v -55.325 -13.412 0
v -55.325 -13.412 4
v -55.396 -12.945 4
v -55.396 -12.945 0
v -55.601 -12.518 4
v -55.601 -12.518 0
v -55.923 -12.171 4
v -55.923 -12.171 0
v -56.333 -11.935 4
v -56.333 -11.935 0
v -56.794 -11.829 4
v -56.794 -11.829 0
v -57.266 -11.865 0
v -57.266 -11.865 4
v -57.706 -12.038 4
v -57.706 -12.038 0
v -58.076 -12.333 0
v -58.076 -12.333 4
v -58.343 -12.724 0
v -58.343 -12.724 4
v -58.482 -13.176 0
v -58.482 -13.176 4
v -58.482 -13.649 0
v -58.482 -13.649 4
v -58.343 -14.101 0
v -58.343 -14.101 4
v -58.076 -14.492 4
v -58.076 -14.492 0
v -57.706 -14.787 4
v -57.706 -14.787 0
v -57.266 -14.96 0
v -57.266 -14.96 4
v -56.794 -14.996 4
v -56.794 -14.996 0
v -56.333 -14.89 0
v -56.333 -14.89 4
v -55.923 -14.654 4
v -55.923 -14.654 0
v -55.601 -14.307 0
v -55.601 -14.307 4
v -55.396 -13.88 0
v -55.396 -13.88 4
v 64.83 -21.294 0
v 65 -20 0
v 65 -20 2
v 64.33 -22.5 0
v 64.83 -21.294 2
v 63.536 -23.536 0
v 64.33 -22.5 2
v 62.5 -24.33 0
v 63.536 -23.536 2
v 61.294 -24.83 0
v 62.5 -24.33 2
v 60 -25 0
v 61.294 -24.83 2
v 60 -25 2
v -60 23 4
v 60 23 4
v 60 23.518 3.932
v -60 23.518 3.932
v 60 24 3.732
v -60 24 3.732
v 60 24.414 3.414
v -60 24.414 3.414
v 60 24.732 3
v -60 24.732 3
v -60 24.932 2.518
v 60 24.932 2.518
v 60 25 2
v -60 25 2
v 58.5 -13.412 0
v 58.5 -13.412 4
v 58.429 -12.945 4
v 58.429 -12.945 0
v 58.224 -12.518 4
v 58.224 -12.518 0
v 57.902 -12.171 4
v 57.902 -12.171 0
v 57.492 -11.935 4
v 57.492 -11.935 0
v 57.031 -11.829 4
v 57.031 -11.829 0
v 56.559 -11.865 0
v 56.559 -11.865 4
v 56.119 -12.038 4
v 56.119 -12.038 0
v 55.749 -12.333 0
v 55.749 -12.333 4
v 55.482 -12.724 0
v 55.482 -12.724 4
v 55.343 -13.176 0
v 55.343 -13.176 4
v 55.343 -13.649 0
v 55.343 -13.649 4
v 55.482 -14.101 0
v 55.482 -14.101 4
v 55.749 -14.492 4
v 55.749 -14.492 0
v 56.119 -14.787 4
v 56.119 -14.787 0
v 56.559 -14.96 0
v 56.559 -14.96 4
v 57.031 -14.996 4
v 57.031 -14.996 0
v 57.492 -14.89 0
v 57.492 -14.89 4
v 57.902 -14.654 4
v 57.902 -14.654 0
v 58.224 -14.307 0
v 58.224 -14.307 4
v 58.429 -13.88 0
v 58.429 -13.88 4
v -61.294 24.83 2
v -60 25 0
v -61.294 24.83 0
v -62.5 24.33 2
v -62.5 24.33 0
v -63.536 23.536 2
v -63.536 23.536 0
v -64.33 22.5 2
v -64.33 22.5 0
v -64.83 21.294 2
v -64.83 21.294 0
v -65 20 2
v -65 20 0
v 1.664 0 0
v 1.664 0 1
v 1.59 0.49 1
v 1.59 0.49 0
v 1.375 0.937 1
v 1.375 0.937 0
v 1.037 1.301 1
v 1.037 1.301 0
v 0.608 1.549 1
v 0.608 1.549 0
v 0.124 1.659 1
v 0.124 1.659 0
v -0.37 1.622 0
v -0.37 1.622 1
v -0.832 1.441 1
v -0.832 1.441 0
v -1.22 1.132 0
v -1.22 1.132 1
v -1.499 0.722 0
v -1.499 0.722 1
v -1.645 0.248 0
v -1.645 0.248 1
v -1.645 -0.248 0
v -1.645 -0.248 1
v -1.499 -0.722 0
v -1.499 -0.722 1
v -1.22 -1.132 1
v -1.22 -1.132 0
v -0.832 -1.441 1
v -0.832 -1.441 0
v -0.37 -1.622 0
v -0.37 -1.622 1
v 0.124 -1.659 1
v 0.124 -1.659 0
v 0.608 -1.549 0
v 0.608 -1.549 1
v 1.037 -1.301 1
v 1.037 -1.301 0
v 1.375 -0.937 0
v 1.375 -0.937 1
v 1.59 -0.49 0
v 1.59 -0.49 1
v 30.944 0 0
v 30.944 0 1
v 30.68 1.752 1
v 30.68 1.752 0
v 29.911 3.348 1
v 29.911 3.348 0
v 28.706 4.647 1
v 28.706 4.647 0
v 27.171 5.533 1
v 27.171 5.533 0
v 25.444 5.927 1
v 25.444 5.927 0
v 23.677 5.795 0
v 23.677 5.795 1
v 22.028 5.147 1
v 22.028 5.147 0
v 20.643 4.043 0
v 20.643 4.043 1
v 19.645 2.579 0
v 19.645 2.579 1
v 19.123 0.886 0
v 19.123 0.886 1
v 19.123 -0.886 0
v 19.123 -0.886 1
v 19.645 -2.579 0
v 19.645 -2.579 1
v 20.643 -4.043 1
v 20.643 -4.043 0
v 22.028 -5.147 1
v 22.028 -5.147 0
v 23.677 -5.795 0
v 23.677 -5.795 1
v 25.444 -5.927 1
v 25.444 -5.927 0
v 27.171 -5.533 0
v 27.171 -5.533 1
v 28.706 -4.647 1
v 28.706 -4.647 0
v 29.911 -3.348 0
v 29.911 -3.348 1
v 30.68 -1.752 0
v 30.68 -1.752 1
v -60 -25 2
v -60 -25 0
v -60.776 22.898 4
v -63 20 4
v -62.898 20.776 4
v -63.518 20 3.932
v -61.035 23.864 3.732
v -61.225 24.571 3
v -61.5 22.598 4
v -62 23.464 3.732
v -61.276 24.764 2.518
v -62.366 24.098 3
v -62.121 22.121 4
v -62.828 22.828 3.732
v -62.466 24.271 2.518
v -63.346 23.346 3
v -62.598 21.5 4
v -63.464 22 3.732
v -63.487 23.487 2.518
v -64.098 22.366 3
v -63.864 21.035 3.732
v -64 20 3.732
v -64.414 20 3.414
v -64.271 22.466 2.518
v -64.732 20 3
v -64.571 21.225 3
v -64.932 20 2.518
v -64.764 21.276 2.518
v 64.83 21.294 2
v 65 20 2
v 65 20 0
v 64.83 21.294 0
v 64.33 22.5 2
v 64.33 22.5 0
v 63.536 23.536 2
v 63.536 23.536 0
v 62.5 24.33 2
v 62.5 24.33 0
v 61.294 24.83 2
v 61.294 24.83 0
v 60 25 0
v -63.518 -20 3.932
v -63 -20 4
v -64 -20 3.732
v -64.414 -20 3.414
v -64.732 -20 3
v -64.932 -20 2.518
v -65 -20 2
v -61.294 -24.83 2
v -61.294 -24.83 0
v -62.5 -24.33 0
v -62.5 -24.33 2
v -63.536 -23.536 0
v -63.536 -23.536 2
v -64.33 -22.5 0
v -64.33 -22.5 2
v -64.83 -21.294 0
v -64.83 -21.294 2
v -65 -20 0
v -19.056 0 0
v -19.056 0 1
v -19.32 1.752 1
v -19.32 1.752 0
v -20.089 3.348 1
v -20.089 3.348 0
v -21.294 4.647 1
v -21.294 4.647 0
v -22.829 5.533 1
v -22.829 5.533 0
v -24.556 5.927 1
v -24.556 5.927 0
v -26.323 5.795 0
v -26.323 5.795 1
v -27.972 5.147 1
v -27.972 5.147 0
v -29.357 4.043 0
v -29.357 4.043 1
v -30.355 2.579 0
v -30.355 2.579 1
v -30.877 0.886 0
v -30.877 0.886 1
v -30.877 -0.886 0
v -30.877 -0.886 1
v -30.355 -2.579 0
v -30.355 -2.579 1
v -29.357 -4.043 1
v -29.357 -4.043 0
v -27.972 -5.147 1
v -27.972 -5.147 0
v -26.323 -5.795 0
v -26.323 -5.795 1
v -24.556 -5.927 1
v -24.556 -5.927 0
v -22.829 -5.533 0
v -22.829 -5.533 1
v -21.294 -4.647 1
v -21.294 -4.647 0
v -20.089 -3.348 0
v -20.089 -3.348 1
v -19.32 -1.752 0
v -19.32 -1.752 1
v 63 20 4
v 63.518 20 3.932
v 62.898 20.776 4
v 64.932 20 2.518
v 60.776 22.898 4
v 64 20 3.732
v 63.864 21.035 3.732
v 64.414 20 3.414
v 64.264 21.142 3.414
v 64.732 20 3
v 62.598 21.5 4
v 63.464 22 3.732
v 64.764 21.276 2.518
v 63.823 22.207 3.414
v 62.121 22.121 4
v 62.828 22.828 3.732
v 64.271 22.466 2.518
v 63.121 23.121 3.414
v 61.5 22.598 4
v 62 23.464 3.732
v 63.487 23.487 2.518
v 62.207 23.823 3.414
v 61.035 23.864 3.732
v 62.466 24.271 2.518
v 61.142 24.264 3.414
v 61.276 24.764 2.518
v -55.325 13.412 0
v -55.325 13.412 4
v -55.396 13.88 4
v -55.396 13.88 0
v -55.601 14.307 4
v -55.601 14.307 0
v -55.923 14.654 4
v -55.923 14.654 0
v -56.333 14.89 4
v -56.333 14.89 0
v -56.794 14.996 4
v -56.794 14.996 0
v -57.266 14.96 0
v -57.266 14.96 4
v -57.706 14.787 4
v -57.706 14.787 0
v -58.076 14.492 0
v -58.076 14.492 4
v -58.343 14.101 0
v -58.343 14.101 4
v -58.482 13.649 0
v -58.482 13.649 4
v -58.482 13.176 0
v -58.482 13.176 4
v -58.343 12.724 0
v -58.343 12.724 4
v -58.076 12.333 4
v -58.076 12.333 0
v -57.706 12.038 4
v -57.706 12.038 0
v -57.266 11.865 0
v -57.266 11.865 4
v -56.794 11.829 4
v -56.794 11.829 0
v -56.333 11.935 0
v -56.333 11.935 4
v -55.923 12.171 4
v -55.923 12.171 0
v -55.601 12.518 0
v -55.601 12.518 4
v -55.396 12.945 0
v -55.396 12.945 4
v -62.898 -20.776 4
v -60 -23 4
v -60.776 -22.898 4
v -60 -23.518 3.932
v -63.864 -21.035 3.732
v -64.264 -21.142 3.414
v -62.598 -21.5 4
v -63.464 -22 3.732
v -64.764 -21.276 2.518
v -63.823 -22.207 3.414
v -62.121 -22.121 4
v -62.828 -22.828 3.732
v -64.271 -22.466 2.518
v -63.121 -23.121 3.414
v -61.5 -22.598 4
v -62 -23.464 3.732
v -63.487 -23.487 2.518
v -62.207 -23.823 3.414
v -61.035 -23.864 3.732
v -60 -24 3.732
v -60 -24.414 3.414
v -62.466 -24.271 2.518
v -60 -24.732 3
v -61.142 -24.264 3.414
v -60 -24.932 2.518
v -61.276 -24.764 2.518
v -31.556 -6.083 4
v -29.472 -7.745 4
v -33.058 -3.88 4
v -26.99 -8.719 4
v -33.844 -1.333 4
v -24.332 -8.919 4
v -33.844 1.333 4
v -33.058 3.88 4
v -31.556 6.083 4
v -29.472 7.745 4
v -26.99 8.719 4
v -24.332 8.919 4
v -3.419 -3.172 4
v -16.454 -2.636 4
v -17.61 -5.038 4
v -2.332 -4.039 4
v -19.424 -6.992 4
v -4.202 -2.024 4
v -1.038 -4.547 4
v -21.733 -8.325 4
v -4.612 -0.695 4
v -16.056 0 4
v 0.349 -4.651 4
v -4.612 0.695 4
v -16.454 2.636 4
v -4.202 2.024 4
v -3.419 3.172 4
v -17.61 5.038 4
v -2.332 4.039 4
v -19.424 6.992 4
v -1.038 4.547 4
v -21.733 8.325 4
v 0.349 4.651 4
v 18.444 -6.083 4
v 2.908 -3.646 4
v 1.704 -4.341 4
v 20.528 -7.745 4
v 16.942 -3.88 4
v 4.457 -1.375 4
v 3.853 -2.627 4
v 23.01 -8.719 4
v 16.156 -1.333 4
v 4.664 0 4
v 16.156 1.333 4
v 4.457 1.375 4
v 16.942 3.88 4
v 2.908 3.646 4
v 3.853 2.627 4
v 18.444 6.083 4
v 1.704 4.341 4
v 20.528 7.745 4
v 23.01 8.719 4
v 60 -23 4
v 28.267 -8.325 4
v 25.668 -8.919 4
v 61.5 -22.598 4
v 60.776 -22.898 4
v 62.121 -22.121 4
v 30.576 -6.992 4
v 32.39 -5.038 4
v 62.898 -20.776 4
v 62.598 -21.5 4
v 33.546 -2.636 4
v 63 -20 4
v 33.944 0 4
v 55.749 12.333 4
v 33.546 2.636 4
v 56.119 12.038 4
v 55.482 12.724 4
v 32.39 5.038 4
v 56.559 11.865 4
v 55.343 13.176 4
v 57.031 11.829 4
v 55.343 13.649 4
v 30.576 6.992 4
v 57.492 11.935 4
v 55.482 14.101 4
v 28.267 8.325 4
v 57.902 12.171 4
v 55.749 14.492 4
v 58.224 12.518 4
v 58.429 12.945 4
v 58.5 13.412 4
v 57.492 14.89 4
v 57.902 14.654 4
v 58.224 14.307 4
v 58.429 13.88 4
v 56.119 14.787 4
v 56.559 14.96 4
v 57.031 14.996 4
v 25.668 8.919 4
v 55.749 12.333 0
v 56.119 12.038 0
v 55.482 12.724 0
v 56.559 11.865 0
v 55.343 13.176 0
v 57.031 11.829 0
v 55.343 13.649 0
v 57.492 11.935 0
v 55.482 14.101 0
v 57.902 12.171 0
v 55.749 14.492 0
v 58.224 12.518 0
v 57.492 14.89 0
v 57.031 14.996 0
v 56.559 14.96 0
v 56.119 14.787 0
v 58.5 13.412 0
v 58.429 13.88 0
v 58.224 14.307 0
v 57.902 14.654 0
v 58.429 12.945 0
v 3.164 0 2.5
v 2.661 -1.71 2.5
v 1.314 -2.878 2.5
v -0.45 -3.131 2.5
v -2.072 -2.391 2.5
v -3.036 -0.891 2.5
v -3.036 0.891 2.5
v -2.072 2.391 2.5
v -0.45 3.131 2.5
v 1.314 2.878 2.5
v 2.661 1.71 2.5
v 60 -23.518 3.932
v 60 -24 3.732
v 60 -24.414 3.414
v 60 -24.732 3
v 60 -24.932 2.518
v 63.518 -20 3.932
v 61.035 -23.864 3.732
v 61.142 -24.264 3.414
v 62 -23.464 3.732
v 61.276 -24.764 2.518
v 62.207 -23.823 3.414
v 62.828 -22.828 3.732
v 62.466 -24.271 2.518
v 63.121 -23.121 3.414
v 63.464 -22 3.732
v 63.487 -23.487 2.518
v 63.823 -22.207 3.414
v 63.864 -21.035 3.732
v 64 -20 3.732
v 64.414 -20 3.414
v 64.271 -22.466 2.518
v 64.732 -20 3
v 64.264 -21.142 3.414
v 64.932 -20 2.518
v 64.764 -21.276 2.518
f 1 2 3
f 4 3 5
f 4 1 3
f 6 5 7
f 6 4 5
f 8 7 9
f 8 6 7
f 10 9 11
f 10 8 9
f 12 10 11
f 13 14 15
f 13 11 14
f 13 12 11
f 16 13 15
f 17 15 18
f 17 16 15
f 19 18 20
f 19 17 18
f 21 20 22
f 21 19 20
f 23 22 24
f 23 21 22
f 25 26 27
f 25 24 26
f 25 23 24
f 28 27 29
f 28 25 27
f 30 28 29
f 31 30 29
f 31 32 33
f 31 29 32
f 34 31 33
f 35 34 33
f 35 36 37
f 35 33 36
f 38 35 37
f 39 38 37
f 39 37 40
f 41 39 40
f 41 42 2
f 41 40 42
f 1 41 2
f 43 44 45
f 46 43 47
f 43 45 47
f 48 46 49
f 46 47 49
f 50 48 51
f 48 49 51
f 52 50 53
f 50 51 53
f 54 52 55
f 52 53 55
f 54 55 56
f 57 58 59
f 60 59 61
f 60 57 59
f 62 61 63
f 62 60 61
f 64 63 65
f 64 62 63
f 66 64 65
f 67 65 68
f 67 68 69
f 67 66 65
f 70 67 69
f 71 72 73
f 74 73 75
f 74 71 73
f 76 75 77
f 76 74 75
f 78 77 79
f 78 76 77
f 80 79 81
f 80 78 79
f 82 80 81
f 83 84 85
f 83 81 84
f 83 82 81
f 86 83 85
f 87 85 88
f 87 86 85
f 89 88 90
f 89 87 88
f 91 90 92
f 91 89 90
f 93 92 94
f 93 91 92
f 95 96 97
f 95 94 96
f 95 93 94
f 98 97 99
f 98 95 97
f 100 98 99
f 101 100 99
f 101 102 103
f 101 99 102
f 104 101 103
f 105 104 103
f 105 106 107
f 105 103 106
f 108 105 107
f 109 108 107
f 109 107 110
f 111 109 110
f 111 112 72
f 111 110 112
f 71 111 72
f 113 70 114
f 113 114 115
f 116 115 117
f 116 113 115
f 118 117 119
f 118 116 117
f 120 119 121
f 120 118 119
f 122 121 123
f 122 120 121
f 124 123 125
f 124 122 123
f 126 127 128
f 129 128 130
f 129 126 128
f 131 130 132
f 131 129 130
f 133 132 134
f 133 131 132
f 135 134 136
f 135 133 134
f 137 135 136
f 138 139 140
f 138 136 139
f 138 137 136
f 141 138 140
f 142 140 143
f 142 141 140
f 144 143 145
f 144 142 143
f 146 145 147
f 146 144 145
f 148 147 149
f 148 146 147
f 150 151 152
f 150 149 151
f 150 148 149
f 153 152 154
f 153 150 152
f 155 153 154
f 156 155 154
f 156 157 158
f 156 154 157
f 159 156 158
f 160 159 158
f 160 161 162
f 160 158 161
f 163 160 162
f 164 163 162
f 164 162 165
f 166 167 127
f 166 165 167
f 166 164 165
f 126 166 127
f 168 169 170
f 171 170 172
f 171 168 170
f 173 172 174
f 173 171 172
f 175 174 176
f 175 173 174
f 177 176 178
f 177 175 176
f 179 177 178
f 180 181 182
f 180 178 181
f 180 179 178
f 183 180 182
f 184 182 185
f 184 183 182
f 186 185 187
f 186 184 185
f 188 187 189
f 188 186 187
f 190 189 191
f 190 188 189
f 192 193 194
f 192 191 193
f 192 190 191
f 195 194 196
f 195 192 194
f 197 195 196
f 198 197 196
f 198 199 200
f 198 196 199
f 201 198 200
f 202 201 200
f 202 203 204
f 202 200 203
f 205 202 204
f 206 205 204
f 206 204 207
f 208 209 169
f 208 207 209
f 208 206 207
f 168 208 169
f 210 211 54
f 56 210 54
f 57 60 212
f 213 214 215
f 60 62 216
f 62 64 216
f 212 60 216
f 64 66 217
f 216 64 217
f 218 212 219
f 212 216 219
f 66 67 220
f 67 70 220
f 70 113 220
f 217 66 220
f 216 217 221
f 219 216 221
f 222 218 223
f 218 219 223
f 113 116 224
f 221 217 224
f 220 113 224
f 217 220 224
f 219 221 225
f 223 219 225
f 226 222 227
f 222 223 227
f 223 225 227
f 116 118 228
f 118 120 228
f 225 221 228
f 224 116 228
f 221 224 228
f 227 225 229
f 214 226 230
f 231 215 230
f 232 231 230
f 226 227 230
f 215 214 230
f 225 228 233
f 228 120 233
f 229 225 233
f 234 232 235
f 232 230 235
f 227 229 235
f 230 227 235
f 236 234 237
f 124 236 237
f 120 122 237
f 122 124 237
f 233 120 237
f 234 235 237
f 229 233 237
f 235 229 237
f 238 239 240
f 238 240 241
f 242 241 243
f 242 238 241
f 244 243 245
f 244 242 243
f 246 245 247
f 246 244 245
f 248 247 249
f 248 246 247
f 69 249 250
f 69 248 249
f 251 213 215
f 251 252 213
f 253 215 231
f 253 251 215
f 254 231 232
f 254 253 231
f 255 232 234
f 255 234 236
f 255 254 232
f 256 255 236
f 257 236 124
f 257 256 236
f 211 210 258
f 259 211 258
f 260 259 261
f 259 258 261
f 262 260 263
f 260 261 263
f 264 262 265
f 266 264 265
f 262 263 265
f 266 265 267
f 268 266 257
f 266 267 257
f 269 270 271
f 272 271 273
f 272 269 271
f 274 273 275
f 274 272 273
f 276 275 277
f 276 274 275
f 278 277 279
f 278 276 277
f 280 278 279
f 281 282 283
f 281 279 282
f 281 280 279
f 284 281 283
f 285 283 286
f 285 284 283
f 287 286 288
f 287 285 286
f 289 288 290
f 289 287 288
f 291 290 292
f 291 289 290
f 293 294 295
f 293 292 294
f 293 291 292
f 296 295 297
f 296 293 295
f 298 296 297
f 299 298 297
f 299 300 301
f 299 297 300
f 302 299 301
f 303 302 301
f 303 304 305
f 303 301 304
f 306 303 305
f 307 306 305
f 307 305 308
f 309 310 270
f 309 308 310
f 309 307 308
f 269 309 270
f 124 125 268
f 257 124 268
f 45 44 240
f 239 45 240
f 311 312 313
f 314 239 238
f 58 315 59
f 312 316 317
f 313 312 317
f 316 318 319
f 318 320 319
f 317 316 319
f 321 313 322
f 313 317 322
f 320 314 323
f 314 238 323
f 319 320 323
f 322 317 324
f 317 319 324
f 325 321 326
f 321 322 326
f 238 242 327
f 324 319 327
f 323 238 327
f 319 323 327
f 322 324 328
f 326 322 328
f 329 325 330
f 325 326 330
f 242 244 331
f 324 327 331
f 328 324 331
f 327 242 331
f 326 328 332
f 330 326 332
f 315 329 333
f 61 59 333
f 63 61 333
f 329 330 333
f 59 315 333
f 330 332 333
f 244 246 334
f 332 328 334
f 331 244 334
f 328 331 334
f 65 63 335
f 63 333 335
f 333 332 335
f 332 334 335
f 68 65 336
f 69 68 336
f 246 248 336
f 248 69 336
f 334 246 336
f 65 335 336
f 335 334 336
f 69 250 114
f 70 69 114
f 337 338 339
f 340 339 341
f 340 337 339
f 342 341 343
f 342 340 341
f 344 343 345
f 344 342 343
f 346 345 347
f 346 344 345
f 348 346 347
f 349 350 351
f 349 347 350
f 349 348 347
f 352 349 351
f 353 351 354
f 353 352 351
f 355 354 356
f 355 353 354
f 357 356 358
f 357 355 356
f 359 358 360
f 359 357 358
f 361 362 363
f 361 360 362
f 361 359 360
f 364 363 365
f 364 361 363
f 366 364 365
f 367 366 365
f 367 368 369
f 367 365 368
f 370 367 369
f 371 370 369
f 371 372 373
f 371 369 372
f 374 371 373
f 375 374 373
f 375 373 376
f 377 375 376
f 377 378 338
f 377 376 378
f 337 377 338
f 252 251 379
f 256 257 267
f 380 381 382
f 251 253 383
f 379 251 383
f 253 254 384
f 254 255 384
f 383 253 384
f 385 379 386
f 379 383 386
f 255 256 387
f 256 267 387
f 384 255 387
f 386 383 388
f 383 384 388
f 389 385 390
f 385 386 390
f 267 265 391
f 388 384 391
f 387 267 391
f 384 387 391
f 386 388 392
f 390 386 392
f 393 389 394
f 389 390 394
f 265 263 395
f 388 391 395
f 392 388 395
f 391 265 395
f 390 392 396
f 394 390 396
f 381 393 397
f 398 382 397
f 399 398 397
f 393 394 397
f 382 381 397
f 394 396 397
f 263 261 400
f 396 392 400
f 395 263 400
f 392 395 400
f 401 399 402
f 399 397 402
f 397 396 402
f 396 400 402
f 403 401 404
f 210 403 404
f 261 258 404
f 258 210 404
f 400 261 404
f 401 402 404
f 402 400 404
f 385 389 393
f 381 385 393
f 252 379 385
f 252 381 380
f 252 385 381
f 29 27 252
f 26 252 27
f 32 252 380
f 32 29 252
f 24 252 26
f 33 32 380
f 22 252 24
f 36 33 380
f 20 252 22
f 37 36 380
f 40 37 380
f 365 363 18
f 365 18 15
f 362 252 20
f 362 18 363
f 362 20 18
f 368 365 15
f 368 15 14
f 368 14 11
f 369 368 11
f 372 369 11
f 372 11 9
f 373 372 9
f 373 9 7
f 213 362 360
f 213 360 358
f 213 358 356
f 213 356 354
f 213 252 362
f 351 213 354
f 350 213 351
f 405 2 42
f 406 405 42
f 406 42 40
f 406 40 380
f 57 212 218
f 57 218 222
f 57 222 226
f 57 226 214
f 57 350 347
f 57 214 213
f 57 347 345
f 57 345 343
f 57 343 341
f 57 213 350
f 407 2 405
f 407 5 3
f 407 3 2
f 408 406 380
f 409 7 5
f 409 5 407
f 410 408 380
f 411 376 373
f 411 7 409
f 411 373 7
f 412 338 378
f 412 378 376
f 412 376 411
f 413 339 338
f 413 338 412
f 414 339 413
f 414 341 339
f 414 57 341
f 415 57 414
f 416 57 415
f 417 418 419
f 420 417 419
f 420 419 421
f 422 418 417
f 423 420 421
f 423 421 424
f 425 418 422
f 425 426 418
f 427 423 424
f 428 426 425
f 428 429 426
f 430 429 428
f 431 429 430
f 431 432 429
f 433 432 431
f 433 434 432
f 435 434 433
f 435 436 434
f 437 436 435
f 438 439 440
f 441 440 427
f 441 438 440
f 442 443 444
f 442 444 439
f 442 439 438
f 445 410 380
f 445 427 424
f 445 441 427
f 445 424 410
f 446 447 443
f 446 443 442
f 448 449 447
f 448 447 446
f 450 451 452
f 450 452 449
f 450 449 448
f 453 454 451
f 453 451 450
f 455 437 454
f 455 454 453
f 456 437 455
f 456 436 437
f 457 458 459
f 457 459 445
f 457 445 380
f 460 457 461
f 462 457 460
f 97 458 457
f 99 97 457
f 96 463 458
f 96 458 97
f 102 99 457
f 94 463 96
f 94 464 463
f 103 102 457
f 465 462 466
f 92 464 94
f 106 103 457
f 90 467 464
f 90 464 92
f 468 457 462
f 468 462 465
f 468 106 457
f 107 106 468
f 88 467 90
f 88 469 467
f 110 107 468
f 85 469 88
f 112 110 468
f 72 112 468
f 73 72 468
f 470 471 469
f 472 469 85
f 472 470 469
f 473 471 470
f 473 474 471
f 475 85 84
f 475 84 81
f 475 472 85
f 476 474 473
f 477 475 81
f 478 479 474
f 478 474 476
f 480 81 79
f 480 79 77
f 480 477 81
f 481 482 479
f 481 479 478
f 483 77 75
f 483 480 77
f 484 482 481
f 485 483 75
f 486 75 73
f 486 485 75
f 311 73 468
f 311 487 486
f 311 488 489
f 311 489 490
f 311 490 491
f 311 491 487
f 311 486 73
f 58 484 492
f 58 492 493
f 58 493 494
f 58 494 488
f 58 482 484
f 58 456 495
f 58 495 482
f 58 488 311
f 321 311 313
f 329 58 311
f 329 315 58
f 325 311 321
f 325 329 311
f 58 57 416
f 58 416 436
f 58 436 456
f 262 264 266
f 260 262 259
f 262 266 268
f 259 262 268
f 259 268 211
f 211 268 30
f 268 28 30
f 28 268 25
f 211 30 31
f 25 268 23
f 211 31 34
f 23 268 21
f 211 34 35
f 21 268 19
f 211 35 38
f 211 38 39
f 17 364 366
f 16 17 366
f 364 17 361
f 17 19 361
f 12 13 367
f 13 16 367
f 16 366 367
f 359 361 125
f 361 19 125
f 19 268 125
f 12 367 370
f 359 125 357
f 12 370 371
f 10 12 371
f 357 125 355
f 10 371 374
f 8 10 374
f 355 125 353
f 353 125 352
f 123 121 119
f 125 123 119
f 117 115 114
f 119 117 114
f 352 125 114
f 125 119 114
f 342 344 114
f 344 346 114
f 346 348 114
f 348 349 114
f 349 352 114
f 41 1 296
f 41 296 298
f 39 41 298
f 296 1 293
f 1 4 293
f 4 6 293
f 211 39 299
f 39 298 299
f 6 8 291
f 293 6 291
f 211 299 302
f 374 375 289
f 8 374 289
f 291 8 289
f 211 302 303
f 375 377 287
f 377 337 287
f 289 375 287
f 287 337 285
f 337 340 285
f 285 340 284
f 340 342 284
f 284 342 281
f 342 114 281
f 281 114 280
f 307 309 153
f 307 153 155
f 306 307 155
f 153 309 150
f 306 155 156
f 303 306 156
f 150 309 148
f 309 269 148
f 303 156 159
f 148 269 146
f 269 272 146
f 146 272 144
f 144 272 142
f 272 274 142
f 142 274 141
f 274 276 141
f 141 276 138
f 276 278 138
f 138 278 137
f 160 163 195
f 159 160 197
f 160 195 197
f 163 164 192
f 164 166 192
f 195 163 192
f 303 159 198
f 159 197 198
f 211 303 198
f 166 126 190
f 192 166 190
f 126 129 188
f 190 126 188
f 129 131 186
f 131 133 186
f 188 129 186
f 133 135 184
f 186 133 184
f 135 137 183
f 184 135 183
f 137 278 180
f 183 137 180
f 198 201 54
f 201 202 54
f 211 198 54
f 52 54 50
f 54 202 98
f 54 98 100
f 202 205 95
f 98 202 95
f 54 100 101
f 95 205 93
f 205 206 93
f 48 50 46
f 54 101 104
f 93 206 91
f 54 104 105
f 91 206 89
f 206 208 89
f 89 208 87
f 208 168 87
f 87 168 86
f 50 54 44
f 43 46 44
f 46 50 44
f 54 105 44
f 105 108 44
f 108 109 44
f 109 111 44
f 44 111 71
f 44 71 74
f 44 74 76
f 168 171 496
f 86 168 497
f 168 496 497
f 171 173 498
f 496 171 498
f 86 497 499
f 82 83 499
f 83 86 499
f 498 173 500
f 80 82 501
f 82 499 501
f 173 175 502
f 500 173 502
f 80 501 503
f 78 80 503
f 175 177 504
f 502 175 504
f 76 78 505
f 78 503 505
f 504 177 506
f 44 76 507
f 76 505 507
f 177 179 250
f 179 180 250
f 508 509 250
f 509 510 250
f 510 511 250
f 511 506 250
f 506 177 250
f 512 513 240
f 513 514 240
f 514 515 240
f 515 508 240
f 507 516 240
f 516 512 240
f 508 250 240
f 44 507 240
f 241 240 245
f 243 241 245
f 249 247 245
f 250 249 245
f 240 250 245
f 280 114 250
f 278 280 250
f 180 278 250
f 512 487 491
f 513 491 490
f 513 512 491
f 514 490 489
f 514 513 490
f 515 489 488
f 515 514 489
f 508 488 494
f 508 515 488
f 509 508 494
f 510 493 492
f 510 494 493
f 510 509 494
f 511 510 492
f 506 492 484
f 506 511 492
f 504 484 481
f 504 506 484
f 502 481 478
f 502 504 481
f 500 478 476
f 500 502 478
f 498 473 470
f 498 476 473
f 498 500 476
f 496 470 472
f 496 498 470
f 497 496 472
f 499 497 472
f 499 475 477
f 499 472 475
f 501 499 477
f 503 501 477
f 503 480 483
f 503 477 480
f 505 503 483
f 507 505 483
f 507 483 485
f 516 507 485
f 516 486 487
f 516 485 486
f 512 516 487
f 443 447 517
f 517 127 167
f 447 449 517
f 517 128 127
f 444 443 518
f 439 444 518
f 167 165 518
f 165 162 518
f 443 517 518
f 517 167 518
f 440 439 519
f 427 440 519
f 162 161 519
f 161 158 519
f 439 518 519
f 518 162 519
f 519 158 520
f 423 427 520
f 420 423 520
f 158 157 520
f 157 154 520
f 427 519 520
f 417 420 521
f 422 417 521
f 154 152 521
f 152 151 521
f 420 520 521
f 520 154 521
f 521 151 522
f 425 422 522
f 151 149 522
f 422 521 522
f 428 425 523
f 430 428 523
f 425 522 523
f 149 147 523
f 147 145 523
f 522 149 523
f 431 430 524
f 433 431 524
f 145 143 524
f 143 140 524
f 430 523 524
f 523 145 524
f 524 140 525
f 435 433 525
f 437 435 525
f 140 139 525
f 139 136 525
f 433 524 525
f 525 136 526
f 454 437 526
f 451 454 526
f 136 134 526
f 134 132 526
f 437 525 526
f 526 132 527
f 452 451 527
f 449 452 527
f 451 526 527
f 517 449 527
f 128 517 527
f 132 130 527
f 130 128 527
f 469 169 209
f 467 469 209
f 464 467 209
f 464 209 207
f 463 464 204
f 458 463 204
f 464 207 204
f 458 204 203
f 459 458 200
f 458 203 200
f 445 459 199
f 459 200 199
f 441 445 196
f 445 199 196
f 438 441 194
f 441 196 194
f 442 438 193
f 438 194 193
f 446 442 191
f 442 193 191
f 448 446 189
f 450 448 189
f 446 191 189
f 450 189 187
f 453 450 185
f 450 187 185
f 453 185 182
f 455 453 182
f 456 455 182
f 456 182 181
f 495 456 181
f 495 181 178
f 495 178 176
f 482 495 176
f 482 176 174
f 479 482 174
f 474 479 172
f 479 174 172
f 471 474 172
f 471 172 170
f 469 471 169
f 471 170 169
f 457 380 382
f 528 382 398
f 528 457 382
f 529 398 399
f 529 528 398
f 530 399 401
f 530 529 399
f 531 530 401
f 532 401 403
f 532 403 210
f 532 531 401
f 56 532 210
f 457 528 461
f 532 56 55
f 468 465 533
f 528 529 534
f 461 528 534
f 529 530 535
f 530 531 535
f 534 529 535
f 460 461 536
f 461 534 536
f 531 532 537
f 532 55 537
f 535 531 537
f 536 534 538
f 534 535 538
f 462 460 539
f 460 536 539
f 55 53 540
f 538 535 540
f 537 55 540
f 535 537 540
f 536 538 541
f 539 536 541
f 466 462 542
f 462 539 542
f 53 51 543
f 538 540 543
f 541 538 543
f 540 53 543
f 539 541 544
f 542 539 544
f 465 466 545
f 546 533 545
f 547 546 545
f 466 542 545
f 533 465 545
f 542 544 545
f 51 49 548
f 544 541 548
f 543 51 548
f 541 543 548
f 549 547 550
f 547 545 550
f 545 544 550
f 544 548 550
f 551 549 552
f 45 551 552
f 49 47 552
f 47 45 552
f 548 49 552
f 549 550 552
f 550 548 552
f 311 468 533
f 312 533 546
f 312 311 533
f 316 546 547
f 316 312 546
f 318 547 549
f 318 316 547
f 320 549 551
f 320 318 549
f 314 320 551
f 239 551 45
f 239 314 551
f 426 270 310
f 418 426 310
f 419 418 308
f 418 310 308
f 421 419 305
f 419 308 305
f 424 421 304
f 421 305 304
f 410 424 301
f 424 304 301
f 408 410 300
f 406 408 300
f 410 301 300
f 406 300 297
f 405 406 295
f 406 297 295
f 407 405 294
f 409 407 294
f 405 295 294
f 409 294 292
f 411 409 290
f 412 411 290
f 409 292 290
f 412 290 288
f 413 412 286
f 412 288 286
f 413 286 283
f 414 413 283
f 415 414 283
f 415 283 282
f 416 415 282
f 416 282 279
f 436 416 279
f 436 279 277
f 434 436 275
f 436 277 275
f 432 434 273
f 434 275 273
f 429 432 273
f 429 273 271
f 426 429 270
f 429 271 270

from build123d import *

# Parameters (mm, degrees)
F1_DEPTH = 4
F2_R     = 5.9436
F2_R_2   = 1.6637
F2_R_3   = 1.5875
F3_DEPTH = 25
F4_R     = 5
F5_R     = 2
F6_SIZE  = 3
F7_SIZE  = 3


# Not quite as in the source:
# - a feature names something its author has since deleted; it is built from what else it names


with BuildPart() as f1:
    # F0 (on Top) → F1 (new body)
    with BuildSketch(Plane.XY):
        Polygon((65, -25), (65, 25), (33, 25), (-33, 25), (-65, 25), (-65, -25), align=None)
    extrude(amount=F1_DEPTH)

    # F2 (on Top) → F3 (cut)
    with BuildSketch(Plane.XY):
        with Locations((-25, 0)):
            Circle(F2_R)
        Circle(F2_R_2)
        with Locations((25, 0)):
            Circle(F2_R)
        with Locations((-56.9125, 13.4125)):
            Circle(F2_R_3)
        with Locations((-56.9125, -13.4125)):
            Circle(F2_R_3)
        with Locations((56.9125, 13.4125)):
            Circle(F2_R_3)
        with Locations((56.9125, -13.4125)):
            Circle(F2_R_3)
    extrude(amount=F3_DEPTH, mode=Mode.SUBTRACT)

    # F4
    f4_edges = [f1.edges().sort_by_distance(p)[0] for p in [
        (-65, -25, 2),
        (65, -25, 2),
        (65, 25, 2),
        (-65, 25, 2),
    ]]
    fillet(f4_edges, radius=F4_R)

    # F5
    f5_edges = [f1.edges().sort_by_distance(p)[0] for p in [
        (-65, 0, 4),
    ]]
    fillet(f5_edges, radius=F5_R)

    # F6
    f6_edges = [f1.edges().sort_by_distance(p)[0] for p in [
        (-30.9436, 0, 4),
        (19.0564, 0, 4),
    ]]
    chamfer(f6_edges, length=F6_SIZE)

    # F7
    f7_edges = [f1.edges().sort_by_distance(p)[0] for p in [
        (-1.6637, 0, 4),
    ]]
    chamfer(f7_edges, length=F7_SIZE)


solid = f1.part
